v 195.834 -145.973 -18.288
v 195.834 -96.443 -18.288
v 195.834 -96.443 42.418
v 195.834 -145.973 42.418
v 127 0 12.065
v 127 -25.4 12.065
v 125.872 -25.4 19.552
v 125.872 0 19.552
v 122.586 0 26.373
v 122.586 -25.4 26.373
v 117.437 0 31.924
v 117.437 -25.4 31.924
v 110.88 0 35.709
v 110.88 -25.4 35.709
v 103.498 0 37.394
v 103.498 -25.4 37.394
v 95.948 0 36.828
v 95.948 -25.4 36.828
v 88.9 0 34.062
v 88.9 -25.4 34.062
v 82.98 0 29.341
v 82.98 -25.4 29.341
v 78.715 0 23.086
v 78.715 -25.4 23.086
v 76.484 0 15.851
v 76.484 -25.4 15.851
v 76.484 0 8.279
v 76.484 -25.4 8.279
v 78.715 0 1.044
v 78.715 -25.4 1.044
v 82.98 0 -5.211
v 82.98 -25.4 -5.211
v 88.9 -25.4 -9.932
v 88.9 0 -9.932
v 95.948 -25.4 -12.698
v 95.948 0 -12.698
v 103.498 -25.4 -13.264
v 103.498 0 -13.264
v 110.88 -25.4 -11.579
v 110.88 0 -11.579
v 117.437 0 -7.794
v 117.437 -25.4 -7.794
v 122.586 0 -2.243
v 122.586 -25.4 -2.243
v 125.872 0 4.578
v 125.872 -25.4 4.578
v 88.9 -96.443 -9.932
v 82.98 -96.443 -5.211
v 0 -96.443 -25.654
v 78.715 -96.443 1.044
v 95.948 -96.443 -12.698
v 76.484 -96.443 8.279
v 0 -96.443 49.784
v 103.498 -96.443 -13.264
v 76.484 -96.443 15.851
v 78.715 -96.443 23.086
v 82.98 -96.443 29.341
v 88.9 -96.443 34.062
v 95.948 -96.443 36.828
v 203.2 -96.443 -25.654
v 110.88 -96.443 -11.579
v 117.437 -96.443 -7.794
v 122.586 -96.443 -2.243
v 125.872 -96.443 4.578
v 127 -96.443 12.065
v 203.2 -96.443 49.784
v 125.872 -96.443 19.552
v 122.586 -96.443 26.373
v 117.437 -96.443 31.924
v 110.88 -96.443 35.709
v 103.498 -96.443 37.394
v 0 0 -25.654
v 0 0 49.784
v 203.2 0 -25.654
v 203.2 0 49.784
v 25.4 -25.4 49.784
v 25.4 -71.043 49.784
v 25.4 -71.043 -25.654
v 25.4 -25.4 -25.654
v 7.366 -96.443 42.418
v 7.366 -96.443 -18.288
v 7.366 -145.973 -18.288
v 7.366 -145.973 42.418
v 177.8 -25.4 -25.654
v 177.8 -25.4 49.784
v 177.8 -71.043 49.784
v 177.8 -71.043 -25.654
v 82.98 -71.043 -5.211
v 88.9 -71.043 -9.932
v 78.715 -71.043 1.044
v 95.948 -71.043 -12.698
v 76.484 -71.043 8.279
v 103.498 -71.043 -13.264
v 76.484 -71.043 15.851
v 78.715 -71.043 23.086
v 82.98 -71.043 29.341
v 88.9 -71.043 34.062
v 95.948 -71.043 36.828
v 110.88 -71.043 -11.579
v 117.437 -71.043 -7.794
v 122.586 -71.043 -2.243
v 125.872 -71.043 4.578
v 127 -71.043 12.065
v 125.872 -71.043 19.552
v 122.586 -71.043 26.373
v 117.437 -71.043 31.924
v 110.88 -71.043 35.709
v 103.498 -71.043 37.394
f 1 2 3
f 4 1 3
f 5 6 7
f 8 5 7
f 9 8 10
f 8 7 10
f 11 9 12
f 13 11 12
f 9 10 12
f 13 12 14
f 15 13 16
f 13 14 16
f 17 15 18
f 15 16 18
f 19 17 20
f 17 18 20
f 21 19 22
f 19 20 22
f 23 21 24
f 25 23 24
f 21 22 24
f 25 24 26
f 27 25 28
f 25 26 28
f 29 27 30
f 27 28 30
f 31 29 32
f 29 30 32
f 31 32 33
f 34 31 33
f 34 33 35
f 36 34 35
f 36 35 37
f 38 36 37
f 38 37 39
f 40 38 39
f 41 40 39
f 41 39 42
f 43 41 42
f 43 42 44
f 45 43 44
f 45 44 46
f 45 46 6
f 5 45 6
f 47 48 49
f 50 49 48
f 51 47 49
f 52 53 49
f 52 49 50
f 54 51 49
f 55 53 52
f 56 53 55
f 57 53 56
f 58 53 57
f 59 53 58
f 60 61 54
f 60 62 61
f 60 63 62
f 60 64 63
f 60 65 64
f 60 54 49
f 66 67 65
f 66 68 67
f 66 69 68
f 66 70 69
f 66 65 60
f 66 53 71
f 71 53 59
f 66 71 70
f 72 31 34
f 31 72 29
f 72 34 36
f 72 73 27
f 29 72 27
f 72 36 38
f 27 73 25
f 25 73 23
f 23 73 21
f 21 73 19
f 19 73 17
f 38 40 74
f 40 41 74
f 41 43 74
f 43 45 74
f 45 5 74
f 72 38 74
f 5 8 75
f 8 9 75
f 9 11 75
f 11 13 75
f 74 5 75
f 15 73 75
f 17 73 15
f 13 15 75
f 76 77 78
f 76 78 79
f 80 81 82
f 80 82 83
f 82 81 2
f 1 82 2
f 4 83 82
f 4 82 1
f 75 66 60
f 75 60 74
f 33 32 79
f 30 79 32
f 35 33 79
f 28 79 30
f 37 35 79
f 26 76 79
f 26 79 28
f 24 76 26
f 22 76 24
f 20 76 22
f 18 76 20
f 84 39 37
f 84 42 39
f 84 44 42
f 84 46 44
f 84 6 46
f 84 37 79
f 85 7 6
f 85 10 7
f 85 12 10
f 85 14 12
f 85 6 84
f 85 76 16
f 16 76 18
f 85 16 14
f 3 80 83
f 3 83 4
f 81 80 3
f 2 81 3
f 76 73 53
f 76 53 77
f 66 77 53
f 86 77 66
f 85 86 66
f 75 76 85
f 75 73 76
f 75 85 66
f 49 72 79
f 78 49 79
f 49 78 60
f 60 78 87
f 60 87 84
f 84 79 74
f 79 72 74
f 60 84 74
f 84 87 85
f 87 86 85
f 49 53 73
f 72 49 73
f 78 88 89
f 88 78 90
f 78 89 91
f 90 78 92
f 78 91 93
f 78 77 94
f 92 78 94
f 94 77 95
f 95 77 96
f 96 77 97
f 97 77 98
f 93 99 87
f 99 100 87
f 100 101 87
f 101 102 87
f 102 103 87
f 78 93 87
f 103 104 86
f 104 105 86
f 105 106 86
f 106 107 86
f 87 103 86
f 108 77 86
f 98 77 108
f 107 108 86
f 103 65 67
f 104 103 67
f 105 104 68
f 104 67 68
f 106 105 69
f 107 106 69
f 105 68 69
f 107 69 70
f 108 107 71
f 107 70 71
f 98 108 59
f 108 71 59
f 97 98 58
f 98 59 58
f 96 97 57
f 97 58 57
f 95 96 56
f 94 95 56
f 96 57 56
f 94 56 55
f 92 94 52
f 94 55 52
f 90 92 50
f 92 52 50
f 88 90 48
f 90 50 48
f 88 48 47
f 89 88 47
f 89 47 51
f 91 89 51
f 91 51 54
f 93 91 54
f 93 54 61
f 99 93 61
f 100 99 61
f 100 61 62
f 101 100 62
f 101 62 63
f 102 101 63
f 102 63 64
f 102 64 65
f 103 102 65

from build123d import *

# Parameters (mm, degrees)
F0_W          = 203.2
F0_H          = 96.442764
F0_W_2        = 152.4
F0_H_2        = 45.642764
F1_DEPTH      = 49.784
F1_DEPTH_BACK = 25.654
F2_R          = 25.4
F3_DEPTH      = 96.442764
F4_W          = 188.468
F4_H          = 60.706
F5_DEPTH      = 49.53


with BuildPart() as f1:
    # F0 (on Top) → F1 (new body, two sides)
    with BuildSketch(Plane.XY) as f1_sk:
        with Locations((101.6, -48.221382)):
            Rectangle(F0_W, F0_H)
        with Locations((101.6, -48.221382)):
            Rectangle(F0_W_2, F0_H_2, mode=Mode.SUBTRACT)
    extrude(amount=F1_DEPTH)
    extrude(f1_sk.sketch, amount=-F1_DEPTH_BACK)

    # F2 (on face) → F3 (cut, through all)
    with BuildSketch(Plane.XZ.offset(96.442764)):
        with Locations((101.6, 12.065)):
            Circle(F2_R)
    extrude(amount=-F3_DEPTH, mode=Mode.SUBTRACT)


with BuildPart() as f5:
    # F4 (on face) → F5 (new body)
    with BuildSketch(Plane.XZ.offset(96.442764)):
        with Locations((101.6, 12.065)):
            Rectangle(F4_W, F4_H)
    extrude(amount=F5_DEPTH)


solid = Compound([f1.part, f5.part])
